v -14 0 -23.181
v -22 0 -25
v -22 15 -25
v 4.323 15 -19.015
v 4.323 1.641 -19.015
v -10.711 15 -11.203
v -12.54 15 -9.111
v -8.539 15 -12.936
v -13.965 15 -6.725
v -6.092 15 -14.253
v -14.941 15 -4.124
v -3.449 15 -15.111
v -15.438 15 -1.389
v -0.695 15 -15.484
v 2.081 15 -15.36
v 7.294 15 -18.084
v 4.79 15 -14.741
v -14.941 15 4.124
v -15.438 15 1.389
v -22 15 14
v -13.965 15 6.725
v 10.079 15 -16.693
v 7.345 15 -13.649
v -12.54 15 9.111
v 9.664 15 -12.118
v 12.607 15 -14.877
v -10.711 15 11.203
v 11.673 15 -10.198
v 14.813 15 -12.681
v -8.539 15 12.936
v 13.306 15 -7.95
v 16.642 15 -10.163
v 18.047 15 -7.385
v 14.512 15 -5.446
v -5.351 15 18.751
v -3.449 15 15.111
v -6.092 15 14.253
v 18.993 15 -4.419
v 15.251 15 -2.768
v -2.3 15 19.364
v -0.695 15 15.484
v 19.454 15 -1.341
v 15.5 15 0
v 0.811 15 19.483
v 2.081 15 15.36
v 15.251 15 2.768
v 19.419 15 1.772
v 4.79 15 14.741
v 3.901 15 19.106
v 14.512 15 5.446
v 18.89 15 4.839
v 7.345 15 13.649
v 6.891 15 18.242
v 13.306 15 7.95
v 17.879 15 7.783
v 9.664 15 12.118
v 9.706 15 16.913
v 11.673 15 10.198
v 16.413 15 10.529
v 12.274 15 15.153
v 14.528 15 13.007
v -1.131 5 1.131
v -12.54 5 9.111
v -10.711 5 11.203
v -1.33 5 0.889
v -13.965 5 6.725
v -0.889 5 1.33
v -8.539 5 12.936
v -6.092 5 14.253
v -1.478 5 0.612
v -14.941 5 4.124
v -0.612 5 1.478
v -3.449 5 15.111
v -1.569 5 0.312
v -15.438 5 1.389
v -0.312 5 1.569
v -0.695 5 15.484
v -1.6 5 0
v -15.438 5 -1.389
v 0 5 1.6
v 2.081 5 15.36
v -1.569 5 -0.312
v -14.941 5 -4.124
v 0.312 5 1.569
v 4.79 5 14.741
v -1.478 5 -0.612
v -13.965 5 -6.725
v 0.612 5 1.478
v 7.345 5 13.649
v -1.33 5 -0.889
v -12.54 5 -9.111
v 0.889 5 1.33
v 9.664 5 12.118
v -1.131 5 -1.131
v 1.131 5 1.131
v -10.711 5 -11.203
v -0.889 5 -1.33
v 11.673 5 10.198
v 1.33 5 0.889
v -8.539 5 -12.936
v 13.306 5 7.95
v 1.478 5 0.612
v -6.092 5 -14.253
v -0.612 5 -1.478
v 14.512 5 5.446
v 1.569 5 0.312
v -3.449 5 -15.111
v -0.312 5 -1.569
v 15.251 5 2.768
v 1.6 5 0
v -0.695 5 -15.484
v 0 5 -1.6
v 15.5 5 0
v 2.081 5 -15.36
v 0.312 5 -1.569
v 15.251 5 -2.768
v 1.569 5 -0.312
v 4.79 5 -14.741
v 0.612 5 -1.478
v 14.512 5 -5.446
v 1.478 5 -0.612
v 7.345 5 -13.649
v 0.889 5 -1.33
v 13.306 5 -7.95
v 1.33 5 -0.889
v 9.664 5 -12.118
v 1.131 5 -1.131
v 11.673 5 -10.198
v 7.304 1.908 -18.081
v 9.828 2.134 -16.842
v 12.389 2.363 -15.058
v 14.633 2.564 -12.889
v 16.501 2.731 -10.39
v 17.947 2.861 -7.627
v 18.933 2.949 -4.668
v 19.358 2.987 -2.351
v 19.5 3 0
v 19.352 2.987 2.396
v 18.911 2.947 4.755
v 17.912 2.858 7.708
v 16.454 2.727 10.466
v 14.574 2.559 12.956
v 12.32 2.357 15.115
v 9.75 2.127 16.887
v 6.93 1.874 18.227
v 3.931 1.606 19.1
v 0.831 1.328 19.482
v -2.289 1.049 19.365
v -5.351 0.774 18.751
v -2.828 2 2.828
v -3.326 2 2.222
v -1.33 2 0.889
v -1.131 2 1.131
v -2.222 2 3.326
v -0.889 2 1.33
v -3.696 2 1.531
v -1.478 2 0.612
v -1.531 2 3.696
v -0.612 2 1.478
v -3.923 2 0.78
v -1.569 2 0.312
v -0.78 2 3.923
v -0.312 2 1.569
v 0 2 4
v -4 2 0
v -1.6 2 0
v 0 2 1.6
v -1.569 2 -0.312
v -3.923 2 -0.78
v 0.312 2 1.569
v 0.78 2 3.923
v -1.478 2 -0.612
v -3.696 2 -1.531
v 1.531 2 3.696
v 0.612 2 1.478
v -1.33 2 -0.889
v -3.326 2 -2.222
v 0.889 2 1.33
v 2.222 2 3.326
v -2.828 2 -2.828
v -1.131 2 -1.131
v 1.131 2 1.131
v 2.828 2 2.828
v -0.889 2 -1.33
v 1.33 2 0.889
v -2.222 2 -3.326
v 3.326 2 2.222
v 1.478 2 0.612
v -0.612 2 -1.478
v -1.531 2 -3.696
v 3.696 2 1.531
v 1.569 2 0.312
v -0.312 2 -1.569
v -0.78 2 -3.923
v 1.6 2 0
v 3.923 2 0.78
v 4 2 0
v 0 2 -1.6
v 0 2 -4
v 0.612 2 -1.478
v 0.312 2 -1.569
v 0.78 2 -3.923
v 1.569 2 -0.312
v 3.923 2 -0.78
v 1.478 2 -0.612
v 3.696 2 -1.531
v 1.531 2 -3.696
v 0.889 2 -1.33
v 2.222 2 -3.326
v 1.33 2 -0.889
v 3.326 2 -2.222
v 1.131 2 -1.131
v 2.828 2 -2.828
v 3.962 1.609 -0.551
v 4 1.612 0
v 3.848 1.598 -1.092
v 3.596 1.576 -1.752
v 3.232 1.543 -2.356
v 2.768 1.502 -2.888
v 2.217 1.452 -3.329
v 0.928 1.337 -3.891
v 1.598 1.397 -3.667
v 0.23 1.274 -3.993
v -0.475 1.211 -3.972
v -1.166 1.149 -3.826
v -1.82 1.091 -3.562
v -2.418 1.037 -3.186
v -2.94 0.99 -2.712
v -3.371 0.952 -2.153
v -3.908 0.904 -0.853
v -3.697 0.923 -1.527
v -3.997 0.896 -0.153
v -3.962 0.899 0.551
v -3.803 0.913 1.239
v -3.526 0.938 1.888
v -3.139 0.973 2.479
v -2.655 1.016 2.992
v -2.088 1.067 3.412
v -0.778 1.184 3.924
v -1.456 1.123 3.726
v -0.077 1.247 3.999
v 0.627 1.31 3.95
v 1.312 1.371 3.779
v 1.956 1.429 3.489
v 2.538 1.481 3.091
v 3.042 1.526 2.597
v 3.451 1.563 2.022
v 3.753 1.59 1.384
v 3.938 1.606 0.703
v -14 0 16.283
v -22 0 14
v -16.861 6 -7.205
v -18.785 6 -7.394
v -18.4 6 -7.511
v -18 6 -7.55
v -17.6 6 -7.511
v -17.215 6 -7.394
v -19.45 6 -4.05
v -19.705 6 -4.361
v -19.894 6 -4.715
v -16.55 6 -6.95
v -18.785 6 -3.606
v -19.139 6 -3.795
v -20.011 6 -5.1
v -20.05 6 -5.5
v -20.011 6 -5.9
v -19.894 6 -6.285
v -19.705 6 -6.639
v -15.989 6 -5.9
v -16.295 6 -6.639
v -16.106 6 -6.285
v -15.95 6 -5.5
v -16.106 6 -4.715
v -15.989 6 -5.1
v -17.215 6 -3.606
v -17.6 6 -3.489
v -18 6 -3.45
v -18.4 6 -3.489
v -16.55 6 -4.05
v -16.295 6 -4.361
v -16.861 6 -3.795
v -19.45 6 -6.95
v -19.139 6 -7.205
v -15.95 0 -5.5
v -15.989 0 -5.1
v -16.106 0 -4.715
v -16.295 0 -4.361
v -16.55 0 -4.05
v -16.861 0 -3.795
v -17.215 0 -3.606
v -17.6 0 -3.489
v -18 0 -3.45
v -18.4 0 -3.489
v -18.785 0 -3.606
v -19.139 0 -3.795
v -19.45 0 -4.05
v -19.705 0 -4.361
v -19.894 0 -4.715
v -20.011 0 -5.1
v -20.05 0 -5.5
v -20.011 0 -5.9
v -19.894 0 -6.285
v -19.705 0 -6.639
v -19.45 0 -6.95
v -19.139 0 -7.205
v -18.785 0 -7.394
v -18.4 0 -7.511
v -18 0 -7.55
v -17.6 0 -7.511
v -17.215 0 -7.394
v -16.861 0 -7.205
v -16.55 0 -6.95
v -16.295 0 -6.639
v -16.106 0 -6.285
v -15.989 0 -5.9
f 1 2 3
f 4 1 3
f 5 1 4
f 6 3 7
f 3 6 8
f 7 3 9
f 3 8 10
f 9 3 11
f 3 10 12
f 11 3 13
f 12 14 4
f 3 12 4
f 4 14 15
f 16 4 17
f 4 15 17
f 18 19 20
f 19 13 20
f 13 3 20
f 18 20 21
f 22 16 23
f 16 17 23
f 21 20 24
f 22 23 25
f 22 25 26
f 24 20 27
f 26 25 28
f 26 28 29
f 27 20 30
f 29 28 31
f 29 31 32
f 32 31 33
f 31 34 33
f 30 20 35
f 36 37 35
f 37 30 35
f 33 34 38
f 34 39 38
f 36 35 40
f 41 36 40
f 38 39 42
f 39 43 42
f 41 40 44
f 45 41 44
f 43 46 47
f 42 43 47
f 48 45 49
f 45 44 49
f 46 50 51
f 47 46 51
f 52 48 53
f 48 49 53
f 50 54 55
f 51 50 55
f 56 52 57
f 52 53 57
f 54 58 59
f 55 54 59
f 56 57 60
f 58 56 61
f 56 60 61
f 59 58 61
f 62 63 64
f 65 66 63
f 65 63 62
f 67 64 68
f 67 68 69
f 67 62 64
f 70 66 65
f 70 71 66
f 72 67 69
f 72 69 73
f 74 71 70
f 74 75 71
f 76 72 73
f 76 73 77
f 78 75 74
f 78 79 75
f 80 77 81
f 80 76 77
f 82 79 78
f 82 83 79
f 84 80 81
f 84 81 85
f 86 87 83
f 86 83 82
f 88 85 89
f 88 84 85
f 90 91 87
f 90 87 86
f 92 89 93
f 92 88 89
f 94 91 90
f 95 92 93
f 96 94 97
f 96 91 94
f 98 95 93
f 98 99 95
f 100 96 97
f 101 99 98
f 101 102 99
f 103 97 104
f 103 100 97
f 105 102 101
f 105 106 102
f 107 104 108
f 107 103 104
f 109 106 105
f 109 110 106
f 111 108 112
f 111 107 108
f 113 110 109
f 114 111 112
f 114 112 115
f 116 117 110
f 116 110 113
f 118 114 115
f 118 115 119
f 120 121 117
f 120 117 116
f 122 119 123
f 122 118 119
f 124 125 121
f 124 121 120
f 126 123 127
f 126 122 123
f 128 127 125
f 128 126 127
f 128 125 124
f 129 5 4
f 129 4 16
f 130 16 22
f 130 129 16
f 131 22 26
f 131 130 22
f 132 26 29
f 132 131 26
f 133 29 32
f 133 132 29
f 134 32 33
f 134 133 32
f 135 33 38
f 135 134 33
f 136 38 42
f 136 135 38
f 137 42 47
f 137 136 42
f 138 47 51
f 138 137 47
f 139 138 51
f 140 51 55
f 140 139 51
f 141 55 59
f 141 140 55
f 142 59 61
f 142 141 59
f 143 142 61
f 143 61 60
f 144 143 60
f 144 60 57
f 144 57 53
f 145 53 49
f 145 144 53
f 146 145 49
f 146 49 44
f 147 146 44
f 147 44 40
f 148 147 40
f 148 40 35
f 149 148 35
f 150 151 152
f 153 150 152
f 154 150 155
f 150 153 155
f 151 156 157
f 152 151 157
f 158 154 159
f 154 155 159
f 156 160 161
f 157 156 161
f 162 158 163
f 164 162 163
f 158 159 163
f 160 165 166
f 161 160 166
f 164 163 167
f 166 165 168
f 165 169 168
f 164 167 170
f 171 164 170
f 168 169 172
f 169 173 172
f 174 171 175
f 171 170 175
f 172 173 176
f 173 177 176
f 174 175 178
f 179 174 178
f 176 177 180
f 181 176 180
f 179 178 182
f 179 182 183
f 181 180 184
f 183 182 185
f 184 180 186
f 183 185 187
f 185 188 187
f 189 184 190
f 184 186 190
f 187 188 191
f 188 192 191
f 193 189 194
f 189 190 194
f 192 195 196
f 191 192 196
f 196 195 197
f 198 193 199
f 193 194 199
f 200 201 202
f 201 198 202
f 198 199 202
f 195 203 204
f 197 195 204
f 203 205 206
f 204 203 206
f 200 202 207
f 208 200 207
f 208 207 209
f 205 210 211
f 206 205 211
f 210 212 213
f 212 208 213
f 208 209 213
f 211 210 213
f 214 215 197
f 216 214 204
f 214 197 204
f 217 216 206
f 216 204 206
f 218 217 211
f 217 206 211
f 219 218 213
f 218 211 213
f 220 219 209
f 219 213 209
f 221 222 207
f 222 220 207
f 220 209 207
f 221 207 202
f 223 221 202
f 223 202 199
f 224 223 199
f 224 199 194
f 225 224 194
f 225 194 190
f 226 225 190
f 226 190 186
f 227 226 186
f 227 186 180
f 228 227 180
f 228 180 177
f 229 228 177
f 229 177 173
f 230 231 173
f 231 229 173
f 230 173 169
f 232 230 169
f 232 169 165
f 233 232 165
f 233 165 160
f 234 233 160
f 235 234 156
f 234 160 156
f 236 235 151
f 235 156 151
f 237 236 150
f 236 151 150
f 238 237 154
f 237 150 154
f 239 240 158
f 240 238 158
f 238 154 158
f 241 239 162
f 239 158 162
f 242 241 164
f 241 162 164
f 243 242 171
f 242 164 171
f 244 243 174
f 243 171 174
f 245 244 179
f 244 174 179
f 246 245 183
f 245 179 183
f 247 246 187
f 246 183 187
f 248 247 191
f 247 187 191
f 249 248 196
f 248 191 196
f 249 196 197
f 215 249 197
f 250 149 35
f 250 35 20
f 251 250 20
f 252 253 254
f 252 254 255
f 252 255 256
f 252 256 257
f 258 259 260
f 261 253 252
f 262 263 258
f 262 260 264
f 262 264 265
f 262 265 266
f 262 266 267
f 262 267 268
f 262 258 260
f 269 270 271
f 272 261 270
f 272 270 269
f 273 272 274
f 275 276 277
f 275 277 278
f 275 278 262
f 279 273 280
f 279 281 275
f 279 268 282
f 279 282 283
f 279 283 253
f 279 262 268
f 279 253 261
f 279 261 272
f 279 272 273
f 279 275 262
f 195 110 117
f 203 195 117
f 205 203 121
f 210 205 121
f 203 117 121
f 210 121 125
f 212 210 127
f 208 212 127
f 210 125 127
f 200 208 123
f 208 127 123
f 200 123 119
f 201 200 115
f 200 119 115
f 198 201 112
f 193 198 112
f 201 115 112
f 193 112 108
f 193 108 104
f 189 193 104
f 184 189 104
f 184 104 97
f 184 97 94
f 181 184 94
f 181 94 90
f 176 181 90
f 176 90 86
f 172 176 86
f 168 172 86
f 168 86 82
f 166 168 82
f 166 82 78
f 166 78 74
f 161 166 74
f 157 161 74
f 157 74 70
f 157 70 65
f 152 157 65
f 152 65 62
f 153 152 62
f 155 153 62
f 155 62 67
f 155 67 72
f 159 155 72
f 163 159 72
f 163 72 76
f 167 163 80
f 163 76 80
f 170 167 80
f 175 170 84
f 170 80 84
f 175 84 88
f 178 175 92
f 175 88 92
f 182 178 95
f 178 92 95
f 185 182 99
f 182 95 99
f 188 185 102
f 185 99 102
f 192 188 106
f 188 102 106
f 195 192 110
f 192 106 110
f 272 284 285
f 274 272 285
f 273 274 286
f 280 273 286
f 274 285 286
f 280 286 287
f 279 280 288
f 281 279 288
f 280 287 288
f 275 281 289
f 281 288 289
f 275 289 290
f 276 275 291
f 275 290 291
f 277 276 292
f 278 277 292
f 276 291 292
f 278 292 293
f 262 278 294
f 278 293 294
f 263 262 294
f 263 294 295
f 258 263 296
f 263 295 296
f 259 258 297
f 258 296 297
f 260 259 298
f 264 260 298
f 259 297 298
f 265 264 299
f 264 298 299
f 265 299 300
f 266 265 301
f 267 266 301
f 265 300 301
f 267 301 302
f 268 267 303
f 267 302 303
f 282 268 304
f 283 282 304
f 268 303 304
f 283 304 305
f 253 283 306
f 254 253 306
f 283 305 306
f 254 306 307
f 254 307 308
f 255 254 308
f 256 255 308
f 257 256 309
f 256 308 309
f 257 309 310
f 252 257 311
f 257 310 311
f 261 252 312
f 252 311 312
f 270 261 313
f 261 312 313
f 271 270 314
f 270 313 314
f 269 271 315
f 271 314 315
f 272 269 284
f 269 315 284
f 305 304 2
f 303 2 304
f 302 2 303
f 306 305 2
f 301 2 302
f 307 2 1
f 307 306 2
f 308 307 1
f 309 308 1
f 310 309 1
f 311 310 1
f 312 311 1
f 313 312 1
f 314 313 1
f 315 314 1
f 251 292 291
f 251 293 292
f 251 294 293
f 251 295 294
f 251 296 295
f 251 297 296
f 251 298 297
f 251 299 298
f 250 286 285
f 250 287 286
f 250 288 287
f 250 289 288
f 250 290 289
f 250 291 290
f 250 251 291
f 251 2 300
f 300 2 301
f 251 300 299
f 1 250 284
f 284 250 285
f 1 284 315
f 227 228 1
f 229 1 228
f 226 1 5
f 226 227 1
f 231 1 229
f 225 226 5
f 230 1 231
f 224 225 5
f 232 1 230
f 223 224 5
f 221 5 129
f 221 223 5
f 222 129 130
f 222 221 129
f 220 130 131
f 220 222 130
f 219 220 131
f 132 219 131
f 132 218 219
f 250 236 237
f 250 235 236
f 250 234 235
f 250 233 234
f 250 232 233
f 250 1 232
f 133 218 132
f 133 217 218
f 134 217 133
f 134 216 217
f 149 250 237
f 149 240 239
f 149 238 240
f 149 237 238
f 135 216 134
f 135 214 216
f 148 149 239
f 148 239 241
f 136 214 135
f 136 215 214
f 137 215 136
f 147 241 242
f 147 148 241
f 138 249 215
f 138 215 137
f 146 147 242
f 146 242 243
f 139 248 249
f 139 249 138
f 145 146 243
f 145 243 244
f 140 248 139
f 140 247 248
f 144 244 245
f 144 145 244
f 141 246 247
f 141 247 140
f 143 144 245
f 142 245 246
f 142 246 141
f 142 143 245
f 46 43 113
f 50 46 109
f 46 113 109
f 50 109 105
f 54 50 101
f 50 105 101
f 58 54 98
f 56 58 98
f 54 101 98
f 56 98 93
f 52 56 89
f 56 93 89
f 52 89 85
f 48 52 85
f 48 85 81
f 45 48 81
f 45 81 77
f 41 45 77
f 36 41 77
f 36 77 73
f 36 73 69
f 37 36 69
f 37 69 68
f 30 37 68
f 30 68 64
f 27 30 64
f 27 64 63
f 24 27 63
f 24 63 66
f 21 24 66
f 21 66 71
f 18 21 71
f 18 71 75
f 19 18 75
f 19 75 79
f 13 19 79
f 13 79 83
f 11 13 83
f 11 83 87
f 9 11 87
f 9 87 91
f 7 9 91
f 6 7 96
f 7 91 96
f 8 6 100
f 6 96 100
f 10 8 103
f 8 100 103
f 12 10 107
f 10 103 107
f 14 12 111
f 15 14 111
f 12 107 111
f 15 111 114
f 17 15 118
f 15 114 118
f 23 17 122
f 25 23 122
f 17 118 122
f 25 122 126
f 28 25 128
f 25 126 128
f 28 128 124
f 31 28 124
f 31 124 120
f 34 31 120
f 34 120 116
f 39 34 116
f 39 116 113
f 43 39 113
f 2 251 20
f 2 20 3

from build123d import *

# Parameters (mm, degrees)
SKETCH1_R               = 15.5
BOSS_EXTRUDE1_DEPTH     = 5
SKETCH2_R               = 15.5
BOSS_EXTRUDE2_DEPTH     = 15
CUT_EXTRUDE7_DEPTH      = 20.5
CUT_EXTRUDE7_DEPTH_BACK = 26
SKETCH18_R              = 1.6
CUT_EXTRUDE8_DEPTH      = 6
SKETCH19_R              = 2.05
CUT_EXTRUDE9_DEPTH      = 6
CUT_EXTRUDE10_REACH     = 4
SKETCH20_R              = 4


with BuildPart() as part:
    # Sketch1 → Boss-Extrude1 (new body)
    with BuildSketch(Plane(origin=(0, 0, 0), x_dir=(1, 0, 0), z_dir=(0, 1, 0))):
        Circle(SKETCH1_R)
    extrude(amount=BOSS_EXTRUDE1_DEPTH)

    # Sketch2 → Boss-Extrude2 (add)
    with BuildSketch(Plane.XZ):
        with BuildLine():
            Line((-22, -25), (4.323483194, -19.014665211))
            ThreePointArc((4.323483194, -19.014665211), (18.889988887, 4.839247858), (-5.351429285, 18.751325409))
            Line((-5.351429285, 18.751325409), (-22, 14))
            Line((-22, 14), (-22, -25))
        make_face()
        Circle(SKETCH2_R, mode=Mode.SUBTRACT)
    extrude(amount=-BOSS_EXTRUDE2_DEPTH)

    # Sketch17 → Cut-Extrude7 (cut, two sides)
    with BuildSketch(Plane.XY) as cut_extrude7_sk:
        Polygon((19.5, 0), (-14, 0), (19.5, 3), align=None)
    extrude(amount=CUT_EXTRUDE7_DEPTH, mode=Mode.SUBTRACT)
    extrude(cut_extrude7_sk.sketch, amount=-CUT_EXTRUDE7_DEPTH_BACK, mode=Mode.SUBTRACT)

    # Sketch18 → Cut-Extrude8 (cut, through all)
    with BuildSketch(Plane(origin=(0, 5, 0), x_dir=(1, 0, 0), z_dir=(0, 1, 0))):
        Circle(SKETCH18_R)
    extrude(amount=-CUT_EXTRUDE8_DEPTH, mode=Mode.SUBTRACT)

    # Sketch19 → Cut-Extrude9 (cut)
    with BuildSketch(Plane.XZ):
        with Locations((-18, -5.5)):
            Circle(SKETCH19_R)
    extrude(amount=-CUT_EXTRUDE9_DEPTH, mode=Mode.SUBTRACT)

    # Sketch20 → Cut-Extrude10 (cut, up to next)
    with BuildSketch(Plane(origin=(0, 2, 0), x_dir=(1, 0, 0), z_dir=(0, 1, 0)), mode=Mode.PRIVATE) as cut_extrude10_sk1:
        Circle(SKETCH20_R)
    cut_extrude10_tool1 = extrude(cut_extrude10_sk1.sketch, amount=-CUT_EXTRUDE10_REACH, mode=Mode.PRIVATE) & part.part
    add(cut_extrude10_tool1.solids().sort_by_distance((0, 2, 0))[0], mode=Mode.SUBTRACT)


solid = part.part
